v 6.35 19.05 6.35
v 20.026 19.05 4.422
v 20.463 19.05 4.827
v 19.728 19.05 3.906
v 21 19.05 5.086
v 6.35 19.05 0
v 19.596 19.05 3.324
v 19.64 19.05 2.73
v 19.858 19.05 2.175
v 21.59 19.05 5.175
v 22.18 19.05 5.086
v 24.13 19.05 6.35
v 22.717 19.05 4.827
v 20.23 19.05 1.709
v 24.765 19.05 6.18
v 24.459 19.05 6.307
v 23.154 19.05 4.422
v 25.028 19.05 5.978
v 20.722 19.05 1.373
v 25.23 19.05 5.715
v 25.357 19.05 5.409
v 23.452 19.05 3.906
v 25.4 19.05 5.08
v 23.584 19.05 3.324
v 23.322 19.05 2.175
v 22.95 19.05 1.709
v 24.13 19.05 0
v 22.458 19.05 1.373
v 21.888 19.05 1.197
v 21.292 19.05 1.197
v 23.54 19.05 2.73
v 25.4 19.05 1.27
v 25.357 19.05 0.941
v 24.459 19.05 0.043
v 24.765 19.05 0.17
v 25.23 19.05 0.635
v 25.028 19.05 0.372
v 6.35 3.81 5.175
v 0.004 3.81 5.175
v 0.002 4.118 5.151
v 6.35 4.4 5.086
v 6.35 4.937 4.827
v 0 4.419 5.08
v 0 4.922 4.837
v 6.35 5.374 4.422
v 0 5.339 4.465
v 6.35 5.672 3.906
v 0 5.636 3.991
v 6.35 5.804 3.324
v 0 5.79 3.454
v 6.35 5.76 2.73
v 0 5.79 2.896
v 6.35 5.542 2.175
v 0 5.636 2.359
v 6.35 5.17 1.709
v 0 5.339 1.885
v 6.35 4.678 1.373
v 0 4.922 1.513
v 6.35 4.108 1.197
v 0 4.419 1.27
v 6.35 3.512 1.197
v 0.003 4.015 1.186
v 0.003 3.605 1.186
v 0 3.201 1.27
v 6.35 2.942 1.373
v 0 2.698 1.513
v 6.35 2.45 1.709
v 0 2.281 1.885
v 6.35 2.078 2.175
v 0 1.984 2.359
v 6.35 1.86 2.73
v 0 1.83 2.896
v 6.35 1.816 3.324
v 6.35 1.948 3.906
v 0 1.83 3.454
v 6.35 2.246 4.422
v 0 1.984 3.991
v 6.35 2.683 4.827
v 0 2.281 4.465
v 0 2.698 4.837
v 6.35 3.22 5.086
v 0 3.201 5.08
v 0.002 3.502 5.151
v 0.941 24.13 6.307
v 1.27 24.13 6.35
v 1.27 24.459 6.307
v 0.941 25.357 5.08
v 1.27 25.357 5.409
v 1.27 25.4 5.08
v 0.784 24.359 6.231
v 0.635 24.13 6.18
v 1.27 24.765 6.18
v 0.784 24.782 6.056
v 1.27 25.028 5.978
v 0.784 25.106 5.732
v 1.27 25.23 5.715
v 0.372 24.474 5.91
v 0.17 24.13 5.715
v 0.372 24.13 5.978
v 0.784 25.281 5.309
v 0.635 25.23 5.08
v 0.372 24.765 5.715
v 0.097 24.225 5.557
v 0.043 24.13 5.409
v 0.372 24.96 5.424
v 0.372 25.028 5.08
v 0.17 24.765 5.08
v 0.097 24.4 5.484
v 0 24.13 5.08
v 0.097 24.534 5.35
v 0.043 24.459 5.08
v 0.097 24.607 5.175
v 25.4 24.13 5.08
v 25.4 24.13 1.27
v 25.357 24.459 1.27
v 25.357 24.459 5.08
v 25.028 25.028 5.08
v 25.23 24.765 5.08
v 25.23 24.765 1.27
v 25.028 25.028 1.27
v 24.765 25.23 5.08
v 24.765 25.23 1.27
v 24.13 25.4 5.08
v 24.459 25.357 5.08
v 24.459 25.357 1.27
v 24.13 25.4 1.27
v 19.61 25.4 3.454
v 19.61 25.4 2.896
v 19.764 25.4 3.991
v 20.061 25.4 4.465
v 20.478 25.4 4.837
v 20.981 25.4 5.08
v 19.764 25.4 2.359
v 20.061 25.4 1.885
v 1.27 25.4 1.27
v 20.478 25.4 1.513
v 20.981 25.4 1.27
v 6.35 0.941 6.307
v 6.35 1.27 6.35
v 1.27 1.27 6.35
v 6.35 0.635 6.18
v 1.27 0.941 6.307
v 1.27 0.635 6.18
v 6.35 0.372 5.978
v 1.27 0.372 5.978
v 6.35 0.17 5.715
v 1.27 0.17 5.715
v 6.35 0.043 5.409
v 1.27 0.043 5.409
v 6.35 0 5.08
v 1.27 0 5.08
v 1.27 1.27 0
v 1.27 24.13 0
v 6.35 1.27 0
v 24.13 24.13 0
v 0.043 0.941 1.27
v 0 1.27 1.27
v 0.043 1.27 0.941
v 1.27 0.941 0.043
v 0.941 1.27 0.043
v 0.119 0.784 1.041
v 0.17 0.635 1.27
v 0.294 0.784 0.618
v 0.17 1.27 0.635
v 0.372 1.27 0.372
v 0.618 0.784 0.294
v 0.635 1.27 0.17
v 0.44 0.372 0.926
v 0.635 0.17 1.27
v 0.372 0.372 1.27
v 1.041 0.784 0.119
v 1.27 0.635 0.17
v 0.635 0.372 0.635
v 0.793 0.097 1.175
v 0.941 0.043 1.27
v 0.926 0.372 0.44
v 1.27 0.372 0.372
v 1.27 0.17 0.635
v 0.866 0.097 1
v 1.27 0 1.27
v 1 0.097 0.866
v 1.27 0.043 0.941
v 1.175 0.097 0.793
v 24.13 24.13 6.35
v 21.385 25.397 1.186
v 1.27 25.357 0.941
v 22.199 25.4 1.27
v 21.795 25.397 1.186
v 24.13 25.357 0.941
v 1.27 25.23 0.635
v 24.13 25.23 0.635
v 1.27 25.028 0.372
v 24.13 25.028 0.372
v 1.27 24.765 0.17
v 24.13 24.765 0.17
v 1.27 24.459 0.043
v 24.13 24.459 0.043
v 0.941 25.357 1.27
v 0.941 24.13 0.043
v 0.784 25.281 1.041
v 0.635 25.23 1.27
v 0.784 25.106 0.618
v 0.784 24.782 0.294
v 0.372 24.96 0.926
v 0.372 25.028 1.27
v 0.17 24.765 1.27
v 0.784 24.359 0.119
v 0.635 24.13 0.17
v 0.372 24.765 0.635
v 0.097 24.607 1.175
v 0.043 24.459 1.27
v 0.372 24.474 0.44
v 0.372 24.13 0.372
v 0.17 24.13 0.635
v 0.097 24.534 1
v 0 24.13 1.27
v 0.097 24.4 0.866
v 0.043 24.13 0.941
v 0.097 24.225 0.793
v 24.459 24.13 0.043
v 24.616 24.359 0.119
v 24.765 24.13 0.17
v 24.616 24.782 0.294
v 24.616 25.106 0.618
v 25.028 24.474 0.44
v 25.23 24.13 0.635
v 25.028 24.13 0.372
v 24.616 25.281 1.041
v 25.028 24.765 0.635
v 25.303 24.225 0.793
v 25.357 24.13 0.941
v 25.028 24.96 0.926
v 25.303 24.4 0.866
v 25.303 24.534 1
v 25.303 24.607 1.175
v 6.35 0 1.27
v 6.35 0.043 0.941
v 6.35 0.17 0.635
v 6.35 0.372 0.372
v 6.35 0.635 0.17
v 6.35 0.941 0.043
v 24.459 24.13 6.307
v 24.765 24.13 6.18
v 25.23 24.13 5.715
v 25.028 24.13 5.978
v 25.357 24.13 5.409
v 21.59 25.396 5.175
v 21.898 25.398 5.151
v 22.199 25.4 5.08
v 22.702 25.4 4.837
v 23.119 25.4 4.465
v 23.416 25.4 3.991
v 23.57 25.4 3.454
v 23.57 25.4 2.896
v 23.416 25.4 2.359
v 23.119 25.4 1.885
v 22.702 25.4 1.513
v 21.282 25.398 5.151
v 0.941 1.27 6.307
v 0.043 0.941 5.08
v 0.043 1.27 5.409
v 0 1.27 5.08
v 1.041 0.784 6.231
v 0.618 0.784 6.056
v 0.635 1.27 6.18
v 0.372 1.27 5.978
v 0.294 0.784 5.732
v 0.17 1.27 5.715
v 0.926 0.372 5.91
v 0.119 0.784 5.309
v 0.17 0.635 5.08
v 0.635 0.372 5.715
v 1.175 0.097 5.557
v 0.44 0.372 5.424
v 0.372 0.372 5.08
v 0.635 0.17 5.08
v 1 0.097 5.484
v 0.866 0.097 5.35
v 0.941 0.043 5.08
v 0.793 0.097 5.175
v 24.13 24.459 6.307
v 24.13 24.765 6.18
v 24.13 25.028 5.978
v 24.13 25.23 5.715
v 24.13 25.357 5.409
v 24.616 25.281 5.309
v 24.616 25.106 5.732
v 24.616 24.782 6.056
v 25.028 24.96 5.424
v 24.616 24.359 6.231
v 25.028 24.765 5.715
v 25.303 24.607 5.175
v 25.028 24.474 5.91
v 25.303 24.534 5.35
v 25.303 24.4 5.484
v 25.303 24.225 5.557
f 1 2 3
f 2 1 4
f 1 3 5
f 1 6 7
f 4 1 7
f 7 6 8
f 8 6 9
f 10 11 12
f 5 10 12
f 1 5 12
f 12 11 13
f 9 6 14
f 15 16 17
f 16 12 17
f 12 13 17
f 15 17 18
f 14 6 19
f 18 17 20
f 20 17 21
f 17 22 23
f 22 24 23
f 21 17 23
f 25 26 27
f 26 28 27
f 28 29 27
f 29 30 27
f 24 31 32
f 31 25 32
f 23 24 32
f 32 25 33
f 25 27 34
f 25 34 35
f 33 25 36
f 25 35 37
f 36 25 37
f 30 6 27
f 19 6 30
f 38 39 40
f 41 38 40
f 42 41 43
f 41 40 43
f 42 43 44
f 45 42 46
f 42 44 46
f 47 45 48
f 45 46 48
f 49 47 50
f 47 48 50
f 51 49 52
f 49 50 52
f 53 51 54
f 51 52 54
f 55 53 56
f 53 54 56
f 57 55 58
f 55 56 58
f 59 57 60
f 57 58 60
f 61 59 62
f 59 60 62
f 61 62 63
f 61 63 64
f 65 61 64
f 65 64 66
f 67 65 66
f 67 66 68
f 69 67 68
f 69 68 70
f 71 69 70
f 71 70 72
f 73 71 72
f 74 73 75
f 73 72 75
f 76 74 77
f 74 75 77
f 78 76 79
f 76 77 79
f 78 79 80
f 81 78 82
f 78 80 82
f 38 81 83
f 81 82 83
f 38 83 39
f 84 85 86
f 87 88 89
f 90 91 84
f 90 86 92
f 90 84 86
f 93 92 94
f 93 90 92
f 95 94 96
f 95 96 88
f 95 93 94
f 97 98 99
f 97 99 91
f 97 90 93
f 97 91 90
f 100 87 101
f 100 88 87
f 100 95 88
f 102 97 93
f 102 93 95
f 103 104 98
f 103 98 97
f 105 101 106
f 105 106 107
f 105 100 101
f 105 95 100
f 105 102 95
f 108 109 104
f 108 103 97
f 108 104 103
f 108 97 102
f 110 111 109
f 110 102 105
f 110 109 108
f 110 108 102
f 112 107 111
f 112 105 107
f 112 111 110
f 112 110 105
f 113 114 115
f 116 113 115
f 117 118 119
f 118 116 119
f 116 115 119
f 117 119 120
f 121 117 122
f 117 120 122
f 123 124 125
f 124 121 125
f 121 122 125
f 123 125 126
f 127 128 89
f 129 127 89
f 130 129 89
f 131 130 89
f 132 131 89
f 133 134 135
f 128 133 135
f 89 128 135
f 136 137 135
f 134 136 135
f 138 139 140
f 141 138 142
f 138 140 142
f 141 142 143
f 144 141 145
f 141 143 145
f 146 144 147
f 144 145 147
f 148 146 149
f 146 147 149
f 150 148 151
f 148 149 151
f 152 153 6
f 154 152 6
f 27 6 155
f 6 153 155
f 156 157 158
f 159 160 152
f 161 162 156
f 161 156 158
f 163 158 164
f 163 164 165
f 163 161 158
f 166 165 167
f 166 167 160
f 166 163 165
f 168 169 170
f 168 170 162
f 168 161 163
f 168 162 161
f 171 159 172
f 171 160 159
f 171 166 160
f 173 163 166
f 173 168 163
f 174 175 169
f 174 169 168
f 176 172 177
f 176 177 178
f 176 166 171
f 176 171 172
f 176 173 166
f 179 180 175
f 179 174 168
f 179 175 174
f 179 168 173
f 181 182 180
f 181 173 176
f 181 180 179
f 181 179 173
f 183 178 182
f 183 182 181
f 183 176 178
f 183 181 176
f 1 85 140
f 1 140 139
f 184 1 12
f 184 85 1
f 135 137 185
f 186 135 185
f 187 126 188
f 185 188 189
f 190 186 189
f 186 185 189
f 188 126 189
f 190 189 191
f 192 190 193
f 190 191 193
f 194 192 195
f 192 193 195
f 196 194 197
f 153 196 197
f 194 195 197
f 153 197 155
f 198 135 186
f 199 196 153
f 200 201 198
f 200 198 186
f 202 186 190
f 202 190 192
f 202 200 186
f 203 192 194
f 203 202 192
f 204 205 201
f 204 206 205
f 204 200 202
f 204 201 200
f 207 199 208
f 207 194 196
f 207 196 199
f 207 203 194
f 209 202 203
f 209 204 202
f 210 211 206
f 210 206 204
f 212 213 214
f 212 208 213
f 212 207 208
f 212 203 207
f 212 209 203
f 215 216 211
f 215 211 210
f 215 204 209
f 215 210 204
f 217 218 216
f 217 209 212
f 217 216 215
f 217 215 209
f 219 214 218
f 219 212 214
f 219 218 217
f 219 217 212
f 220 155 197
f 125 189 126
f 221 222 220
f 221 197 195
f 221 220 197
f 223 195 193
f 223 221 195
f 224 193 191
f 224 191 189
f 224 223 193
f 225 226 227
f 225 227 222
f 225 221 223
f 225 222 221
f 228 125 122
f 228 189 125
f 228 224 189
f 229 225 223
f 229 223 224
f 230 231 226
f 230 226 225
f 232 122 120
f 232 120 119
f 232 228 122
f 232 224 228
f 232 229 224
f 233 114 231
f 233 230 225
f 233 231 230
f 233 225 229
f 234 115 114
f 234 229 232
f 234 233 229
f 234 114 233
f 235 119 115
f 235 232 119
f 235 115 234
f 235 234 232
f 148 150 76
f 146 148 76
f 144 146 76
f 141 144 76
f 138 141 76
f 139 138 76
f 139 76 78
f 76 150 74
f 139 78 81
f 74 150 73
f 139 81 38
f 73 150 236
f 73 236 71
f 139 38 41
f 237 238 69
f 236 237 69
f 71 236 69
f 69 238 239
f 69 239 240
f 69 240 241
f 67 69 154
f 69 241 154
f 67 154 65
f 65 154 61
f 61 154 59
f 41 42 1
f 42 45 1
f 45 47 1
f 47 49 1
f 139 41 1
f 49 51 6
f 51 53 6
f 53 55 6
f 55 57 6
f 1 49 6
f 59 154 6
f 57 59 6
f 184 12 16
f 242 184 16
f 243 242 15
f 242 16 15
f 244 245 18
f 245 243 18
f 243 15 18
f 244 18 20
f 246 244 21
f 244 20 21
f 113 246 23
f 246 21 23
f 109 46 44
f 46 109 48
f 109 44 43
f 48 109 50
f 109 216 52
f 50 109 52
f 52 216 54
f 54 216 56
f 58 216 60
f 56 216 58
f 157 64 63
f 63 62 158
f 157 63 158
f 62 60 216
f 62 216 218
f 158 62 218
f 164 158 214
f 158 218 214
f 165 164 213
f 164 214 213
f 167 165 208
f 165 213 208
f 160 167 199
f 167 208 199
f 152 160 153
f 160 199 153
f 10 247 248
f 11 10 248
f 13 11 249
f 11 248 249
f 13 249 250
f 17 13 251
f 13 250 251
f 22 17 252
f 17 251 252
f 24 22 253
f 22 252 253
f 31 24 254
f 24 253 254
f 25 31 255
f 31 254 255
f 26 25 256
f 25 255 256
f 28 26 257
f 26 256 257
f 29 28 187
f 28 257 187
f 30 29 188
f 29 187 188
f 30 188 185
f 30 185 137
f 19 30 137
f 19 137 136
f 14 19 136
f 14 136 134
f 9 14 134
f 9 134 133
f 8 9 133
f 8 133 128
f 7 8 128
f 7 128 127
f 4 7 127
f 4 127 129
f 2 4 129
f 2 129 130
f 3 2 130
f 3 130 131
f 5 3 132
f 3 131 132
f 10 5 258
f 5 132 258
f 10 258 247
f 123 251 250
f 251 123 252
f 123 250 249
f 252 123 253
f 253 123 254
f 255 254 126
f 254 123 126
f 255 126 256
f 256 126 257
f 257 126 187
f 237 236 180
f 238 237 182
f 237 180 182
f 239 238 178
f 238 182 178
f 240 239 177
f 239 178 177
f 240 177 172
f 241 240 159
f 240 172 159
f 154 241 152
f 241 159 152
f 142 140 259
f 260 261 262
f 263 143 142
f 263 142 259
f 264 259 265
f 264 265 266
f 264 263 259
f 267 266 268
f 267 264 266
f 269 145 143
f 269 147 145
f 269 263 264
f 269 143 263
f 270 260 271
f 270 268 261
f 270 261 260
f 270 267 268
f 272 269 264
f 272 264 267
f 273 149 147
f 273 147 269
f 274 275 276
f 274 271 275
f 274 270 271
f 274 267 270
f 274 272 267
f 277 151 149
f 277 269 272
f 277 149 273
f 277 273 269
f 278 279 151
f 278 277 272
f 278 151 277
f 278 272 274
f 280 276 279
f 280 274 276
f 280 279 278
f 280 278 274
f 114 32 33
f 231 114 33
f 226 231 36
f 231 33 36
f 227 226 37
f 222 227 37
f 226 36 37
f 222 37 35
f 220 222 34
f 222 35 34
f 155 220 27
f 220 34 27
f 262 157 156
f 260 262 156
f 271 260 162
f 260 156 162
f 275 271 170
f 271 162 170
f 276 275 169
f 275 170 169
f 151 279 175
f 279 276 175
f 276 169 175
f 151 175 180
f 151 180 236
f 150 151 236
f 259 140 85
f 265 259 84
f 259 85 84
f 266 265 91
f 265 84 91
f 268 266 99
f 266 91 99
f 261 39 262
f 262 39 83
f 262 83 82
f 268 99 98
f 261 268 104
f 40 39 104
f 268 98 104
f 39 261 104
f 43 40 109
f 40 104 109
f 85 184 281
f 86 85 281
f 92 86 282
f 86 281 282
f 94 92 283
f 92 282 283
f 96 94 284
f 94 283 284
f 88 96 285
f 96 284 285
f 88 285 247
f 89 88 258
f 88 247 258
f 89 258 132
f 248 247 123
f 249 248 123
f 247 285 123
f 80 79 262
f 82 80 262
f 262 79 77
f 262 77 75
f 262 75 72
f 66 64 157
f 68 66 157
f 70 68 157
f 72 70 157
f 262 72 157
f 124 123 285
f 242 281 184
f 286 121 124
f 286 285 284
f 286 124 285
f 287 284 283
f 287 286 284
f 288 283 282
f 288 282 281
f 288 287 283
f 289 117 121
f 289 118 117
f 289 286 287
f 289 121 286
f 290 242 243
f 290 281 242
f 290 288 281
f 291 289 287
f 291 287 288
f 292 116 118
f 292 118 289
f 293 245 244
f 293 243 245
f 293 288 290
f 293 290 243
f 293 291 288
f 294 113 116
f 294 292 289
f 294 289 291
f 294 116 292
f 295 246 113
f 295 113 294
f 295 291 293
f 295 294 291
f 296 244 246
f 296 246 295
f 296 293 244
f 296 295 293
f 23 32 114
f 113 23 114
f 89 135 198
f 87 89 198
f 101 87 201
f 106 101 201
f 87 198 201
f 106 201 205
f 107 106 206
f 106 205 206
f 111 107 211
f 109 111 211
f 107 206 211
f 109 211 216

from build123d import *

# Parameters (mm, degrees)
BOSS_EXTRUDE1_DEPTH = 6.35
SKETCH2_R           = 2
CUT_EXTRUDE1_DEPTH  = 37.477972806
SKETCH3_R           = 2
CUT_EXTRUDE2_DEPTH  = 37.477972806
FILLET1_R           = 1.27


with BuildPart() as part:
    # Sketch1 → Boss-Extrude1 (new body)
    with BuildSketch(Plane.XY):
        Polygon((0, 0), (6.35, 0), (6.35, 19.05), (25.4, 19.05), (25.4, 25.4), (0, 25.4), align=None)
    extrude(amount=BOSS_EXTRUDE1_DEPTH)

    # Sketch2 → Cut-Extrude1 (cut, through all)
    with BuildSketch(Plane(origin=(0, 25.4, 0), x_dir=(1, 0, 0), z_dir=(0, 1, 0))):
        with Locations(Location((21.59, -3.175, 0), (0, 0, 270))):
            Circle(SKETCH2_R)
    extrude(amount=-CUT_EXTRUDE1_DEPTH, mode=Mode.SUBTRACT)

    # Sketch3 → Cut-Extrude2 (cut, through all)
    with BuildSketch(Plane.ZY):
        with Locations((3.175, 3.81)):
            Circle(SKETCH3_R)
    extrude(amount=-CUT_EXTRUDE2_DEPTH, mode=Mode.SUBTRACT)

    # Fillet1
    # the kernel refuses this fillet: 1.27 mm, written as the material it takes off along each edge
    with BuildSketch(Plane(origin=(1.27, 24.13, 1.27), x_dir=(0, 0, -1), z_dir=(-1, 0, 0))) as fillet1_piece_1_section:
        Polygon((0, 0), (FILLET1_R, 0), (FILLET1_R, -FILLET1_R), (0, -FILLET1_R), align=None)
    fillet1_piece_1 = extrude(amount=FILLET1_R, mode=Mode.PRIVATE)
    fillet1_piece_1 = fillet1_piece_1 - Plane(origin=(1.27, 24.13, 1.27), x_dir=(0, -0.7071067811865475, 0.7071067811865475), z_dir=(-1, 0, 0)) * Sphere(FILLET1_R, mode=Mode.PRIVATE)
    add(fillet1_piece_1, mode=Mode.SUBTRACT)
    with BuildSketch(Plane(origin=(1.27, 24.13, 5.08), x_dir=(0, 0, 1), z_dir=(-1, 0, 0))) as fillet1_piece_2_section:
        Polygon((0, 0), (FILLET1_R, 0), (FILLET1_R, FILLET1_R), (0, FILLET1_R), align=None)
    fillet1_piece_2 = extrude(amount=FILLET1_R, mode=Mode.PRIVATE)
    fillet1_piece_2 = fillet1_piece_2 - Plane(origin=(1.27, 24.13, 5.08), x_dir=(0, -0.7071067811865475, -0.7071067811865475), z_dir=(-1, 0, 0)) * Sphere(FILLET1_R, mode=Mode.PRIVATE)
    add(fillet1_piece_2, mode=Mode.SUBTRACT)
    with BuildSketch(Plane(origin=(24.13, 24.13, 1.27), x_dir=(0, 0, -1), z_dir=(1, 0, 0))) as fillet1_piece_3_section:
        Polygon((0, 0), (FILLET1_R, 0), (FILLET1_R, FILLET1_R), (0, FILLET1_R), align=None)
    fillet1_piece_3 = extrude(amount=FILLET1_R, mode=Mode.PRIVATE)
    fillet1_piece_3 = fillet1_piece_3 - Plane(origin=(24.13, 24.13, 1.27), x_dir=(0, -0.7071067811865475, 0.7071067811865475), z_dir=(1, 0, 0)) * Sphere(FILLET1_R, mode=Mode.PRIVATE)
    add(fillet1_piece_3, mode=Mode.SUBTRACT)
    with BuildSketch(Plane(origin=(24.13, 24.13, 5.08), x_dir=(0, 0, 1), z_dir=(1, 0, 0))) as fillet1_piece_4_section:
        Polygon((0, 0), (FILLET1_R, 0), (FILLET1_R, -FILLET1_R), (0, -FILLET1_R), align=None)
    fillet1_piece_4 = extrude(amount=FILLET1_R, mode=Mode.PRIVATE)
    fillet1_piece_4 = fillet1_piece_4 - Plane(origin=(24.13, 24.13, 5.08), x_dir=(0, -0.7071067811865475, -0.7071067811865475), z_dir=(1, 0, 0)) * Sphere(FILLET1_R, mode=Mode.PRIVATE)
    add(fillet1_piece_4, mode=Mode.SUBTRACT)
    with BuildSketch(Plane(origin=(1.27, 1.27, 1.27), x_dir=(-1, 0, 0), z_dir=(0, -1, 0))) as fillet1_piece_5_section:
        Polygon((0, 0), (FILLET1_R, 0), (FILLET1_R, FILLET1_R), (0, FILLET1_R), align=None)
    fillet1_piece_5 = extrude(amount=FILLET1_R, mode=Mode.PRIVATE)
    fillet1_piece_5 = fillet1_piece_5 - Plane(origin=(1.27, 1.27, 1.27), x_dir=(0.7071067811865475, 0, 0.7071067811865475), z_dir=(0, -1, 0)) * Sphere(FILLET1_R, mode=Mode.PRIVATE)
    add(fillet1_piece_5, mode=Mode.SUBTRACT)
    with BuildSketch(Plane(origin=(1.27, 1.27, 5.08), x_dir=(-1, 0, 0), z_dir=(0, -1, 0))) as fillet1_piece_6_section:
        Polygon((0, 0), (FILLET1_R, 0), (FILLET1_R, -FILLET1_R), (0, -FILLET1_R), align=None)
    fillet1_piece_6 = extrude(amount=FILLET1_R, mode=Mode.PRIVATE)
    fillet1_piece_6 = fillet1_piece_6 - Plane(origin=(1.27, 1.27, 5.08), x_dir=(0.7071067811865475, 0, -0.7071067811865475), z_dir=(0, -1, 0)) * Sphere(FILLET1_R, mode=Mode.PRIVATE)
    add(fillet1_piece_6, mode=Mode.SUBTRACT)
    with BuildSketch(Plane(origin=(0, 25.4, 1.27), x_dir=(0, -1, 0), z_dir=(0, 0, 1)), Plane(origin=(25.4, 25.4, 1.27), x_dir=(-1, 0, 0), z_dir=(0, 0, 1)), Plane(origin=(0, 0, 1.27), x_dir=(1, 0, 0), z_dir=(0, 0, 1))) as fillet1_piece_7:
        with BuildLine():
            CenterArc((FILLET1_R, FILLET1_R), FILLET1_R, 180, 90)
            Line((0, FILLET1_R), (0, 0))
            Line((0, 0), (FILLET1_R, 0))
        make_face()
    extrude(amount=3.81, mode=Mode.SUBTRACT)
    with BuildSketch(Plane(origin=(25.4, 15.875, 6.35), x_dir=(-1, 0, 0), z_dir=(0, 1, 0)), Plane(origin=(1.27, 0, 0), x_dir=(0, 0, 1), z_dir=(1, 0, 0))) as fillet1_piece_8:
        with BuildLine():
            CenterArc((FILLET1_R, -FILLET1_R), FILLET1_R, 90, 90)
            Line((0, -FILLET1_R), (0, 0))
            Line((0, 0), (FILLET1_R, 0))
        make_face()
    extrude(amount=8.255, mode=Mode.SUBTRACT)
    with BuildSketch(Plane(origin=(24.13, 25.4, 6.35), x_dir=(0, -1, 0), z_dir=(-1, 0, 0)), Plane(origin=(0, 24.13, 0), x_dir=(0, 0, 1), z_dir=(0, -1, 0))) as fillet1_piece_9:
        with BuildLine():
            CenterArc((FILLET1_R, -FILLET1_R), FILLET1_R, 90, 90)
            Line((0, -FILLET1_R), (0, 0))
            Line((0, 0), (FILLET1_R, 0))
        make_face()
    extrude(amount=22.86, mode=Mode.SUBTRACT)
    with BuildSketch(Plane(origin=(0, 24.13, 6.35), x_dir=(0, 0, -1), z_dir=(0, -1, 0)), Plane(origin=(24.13, 25.4, 0), x_dir=(0, -1, 0), z_dir=(-1, 0, 0))) as fillet1_piece_10:
        with BuildLine():
            CenterArc((FILLET1_R, FILLET1_R), FILLET1_R, 180, 90)
            Line((0, FILLET1_R), (0, 0))
            Line((0, 0), (FILLET1_R, 0))
        make_face()
    extrude(amount=22.86, mode=Mode.SUBTRACT)
    with BuildSketch(Plane(origin=(25.4, 15.875, 0), x_dir=(-1, 0, 0), z_dir=(0, 1, 0)), Plane(origin=(1.27, 0, 6.35), x_dir=(0, 0, -1), z_dir=(1, 0, 0))) as fillet1_piece_11:
        with BuildLine():
            CenterArc((FILLET1_R, FILLET1_R), FILLET1_R, 180, 90)
            Line((0, FILLET1_R), (0, 0))
            Line((0, 0), (FILLET1_R, 0))
        make_face()
    extrude(amount=8.255, mode=Mode.SUBTRACT)


solid = part.part
